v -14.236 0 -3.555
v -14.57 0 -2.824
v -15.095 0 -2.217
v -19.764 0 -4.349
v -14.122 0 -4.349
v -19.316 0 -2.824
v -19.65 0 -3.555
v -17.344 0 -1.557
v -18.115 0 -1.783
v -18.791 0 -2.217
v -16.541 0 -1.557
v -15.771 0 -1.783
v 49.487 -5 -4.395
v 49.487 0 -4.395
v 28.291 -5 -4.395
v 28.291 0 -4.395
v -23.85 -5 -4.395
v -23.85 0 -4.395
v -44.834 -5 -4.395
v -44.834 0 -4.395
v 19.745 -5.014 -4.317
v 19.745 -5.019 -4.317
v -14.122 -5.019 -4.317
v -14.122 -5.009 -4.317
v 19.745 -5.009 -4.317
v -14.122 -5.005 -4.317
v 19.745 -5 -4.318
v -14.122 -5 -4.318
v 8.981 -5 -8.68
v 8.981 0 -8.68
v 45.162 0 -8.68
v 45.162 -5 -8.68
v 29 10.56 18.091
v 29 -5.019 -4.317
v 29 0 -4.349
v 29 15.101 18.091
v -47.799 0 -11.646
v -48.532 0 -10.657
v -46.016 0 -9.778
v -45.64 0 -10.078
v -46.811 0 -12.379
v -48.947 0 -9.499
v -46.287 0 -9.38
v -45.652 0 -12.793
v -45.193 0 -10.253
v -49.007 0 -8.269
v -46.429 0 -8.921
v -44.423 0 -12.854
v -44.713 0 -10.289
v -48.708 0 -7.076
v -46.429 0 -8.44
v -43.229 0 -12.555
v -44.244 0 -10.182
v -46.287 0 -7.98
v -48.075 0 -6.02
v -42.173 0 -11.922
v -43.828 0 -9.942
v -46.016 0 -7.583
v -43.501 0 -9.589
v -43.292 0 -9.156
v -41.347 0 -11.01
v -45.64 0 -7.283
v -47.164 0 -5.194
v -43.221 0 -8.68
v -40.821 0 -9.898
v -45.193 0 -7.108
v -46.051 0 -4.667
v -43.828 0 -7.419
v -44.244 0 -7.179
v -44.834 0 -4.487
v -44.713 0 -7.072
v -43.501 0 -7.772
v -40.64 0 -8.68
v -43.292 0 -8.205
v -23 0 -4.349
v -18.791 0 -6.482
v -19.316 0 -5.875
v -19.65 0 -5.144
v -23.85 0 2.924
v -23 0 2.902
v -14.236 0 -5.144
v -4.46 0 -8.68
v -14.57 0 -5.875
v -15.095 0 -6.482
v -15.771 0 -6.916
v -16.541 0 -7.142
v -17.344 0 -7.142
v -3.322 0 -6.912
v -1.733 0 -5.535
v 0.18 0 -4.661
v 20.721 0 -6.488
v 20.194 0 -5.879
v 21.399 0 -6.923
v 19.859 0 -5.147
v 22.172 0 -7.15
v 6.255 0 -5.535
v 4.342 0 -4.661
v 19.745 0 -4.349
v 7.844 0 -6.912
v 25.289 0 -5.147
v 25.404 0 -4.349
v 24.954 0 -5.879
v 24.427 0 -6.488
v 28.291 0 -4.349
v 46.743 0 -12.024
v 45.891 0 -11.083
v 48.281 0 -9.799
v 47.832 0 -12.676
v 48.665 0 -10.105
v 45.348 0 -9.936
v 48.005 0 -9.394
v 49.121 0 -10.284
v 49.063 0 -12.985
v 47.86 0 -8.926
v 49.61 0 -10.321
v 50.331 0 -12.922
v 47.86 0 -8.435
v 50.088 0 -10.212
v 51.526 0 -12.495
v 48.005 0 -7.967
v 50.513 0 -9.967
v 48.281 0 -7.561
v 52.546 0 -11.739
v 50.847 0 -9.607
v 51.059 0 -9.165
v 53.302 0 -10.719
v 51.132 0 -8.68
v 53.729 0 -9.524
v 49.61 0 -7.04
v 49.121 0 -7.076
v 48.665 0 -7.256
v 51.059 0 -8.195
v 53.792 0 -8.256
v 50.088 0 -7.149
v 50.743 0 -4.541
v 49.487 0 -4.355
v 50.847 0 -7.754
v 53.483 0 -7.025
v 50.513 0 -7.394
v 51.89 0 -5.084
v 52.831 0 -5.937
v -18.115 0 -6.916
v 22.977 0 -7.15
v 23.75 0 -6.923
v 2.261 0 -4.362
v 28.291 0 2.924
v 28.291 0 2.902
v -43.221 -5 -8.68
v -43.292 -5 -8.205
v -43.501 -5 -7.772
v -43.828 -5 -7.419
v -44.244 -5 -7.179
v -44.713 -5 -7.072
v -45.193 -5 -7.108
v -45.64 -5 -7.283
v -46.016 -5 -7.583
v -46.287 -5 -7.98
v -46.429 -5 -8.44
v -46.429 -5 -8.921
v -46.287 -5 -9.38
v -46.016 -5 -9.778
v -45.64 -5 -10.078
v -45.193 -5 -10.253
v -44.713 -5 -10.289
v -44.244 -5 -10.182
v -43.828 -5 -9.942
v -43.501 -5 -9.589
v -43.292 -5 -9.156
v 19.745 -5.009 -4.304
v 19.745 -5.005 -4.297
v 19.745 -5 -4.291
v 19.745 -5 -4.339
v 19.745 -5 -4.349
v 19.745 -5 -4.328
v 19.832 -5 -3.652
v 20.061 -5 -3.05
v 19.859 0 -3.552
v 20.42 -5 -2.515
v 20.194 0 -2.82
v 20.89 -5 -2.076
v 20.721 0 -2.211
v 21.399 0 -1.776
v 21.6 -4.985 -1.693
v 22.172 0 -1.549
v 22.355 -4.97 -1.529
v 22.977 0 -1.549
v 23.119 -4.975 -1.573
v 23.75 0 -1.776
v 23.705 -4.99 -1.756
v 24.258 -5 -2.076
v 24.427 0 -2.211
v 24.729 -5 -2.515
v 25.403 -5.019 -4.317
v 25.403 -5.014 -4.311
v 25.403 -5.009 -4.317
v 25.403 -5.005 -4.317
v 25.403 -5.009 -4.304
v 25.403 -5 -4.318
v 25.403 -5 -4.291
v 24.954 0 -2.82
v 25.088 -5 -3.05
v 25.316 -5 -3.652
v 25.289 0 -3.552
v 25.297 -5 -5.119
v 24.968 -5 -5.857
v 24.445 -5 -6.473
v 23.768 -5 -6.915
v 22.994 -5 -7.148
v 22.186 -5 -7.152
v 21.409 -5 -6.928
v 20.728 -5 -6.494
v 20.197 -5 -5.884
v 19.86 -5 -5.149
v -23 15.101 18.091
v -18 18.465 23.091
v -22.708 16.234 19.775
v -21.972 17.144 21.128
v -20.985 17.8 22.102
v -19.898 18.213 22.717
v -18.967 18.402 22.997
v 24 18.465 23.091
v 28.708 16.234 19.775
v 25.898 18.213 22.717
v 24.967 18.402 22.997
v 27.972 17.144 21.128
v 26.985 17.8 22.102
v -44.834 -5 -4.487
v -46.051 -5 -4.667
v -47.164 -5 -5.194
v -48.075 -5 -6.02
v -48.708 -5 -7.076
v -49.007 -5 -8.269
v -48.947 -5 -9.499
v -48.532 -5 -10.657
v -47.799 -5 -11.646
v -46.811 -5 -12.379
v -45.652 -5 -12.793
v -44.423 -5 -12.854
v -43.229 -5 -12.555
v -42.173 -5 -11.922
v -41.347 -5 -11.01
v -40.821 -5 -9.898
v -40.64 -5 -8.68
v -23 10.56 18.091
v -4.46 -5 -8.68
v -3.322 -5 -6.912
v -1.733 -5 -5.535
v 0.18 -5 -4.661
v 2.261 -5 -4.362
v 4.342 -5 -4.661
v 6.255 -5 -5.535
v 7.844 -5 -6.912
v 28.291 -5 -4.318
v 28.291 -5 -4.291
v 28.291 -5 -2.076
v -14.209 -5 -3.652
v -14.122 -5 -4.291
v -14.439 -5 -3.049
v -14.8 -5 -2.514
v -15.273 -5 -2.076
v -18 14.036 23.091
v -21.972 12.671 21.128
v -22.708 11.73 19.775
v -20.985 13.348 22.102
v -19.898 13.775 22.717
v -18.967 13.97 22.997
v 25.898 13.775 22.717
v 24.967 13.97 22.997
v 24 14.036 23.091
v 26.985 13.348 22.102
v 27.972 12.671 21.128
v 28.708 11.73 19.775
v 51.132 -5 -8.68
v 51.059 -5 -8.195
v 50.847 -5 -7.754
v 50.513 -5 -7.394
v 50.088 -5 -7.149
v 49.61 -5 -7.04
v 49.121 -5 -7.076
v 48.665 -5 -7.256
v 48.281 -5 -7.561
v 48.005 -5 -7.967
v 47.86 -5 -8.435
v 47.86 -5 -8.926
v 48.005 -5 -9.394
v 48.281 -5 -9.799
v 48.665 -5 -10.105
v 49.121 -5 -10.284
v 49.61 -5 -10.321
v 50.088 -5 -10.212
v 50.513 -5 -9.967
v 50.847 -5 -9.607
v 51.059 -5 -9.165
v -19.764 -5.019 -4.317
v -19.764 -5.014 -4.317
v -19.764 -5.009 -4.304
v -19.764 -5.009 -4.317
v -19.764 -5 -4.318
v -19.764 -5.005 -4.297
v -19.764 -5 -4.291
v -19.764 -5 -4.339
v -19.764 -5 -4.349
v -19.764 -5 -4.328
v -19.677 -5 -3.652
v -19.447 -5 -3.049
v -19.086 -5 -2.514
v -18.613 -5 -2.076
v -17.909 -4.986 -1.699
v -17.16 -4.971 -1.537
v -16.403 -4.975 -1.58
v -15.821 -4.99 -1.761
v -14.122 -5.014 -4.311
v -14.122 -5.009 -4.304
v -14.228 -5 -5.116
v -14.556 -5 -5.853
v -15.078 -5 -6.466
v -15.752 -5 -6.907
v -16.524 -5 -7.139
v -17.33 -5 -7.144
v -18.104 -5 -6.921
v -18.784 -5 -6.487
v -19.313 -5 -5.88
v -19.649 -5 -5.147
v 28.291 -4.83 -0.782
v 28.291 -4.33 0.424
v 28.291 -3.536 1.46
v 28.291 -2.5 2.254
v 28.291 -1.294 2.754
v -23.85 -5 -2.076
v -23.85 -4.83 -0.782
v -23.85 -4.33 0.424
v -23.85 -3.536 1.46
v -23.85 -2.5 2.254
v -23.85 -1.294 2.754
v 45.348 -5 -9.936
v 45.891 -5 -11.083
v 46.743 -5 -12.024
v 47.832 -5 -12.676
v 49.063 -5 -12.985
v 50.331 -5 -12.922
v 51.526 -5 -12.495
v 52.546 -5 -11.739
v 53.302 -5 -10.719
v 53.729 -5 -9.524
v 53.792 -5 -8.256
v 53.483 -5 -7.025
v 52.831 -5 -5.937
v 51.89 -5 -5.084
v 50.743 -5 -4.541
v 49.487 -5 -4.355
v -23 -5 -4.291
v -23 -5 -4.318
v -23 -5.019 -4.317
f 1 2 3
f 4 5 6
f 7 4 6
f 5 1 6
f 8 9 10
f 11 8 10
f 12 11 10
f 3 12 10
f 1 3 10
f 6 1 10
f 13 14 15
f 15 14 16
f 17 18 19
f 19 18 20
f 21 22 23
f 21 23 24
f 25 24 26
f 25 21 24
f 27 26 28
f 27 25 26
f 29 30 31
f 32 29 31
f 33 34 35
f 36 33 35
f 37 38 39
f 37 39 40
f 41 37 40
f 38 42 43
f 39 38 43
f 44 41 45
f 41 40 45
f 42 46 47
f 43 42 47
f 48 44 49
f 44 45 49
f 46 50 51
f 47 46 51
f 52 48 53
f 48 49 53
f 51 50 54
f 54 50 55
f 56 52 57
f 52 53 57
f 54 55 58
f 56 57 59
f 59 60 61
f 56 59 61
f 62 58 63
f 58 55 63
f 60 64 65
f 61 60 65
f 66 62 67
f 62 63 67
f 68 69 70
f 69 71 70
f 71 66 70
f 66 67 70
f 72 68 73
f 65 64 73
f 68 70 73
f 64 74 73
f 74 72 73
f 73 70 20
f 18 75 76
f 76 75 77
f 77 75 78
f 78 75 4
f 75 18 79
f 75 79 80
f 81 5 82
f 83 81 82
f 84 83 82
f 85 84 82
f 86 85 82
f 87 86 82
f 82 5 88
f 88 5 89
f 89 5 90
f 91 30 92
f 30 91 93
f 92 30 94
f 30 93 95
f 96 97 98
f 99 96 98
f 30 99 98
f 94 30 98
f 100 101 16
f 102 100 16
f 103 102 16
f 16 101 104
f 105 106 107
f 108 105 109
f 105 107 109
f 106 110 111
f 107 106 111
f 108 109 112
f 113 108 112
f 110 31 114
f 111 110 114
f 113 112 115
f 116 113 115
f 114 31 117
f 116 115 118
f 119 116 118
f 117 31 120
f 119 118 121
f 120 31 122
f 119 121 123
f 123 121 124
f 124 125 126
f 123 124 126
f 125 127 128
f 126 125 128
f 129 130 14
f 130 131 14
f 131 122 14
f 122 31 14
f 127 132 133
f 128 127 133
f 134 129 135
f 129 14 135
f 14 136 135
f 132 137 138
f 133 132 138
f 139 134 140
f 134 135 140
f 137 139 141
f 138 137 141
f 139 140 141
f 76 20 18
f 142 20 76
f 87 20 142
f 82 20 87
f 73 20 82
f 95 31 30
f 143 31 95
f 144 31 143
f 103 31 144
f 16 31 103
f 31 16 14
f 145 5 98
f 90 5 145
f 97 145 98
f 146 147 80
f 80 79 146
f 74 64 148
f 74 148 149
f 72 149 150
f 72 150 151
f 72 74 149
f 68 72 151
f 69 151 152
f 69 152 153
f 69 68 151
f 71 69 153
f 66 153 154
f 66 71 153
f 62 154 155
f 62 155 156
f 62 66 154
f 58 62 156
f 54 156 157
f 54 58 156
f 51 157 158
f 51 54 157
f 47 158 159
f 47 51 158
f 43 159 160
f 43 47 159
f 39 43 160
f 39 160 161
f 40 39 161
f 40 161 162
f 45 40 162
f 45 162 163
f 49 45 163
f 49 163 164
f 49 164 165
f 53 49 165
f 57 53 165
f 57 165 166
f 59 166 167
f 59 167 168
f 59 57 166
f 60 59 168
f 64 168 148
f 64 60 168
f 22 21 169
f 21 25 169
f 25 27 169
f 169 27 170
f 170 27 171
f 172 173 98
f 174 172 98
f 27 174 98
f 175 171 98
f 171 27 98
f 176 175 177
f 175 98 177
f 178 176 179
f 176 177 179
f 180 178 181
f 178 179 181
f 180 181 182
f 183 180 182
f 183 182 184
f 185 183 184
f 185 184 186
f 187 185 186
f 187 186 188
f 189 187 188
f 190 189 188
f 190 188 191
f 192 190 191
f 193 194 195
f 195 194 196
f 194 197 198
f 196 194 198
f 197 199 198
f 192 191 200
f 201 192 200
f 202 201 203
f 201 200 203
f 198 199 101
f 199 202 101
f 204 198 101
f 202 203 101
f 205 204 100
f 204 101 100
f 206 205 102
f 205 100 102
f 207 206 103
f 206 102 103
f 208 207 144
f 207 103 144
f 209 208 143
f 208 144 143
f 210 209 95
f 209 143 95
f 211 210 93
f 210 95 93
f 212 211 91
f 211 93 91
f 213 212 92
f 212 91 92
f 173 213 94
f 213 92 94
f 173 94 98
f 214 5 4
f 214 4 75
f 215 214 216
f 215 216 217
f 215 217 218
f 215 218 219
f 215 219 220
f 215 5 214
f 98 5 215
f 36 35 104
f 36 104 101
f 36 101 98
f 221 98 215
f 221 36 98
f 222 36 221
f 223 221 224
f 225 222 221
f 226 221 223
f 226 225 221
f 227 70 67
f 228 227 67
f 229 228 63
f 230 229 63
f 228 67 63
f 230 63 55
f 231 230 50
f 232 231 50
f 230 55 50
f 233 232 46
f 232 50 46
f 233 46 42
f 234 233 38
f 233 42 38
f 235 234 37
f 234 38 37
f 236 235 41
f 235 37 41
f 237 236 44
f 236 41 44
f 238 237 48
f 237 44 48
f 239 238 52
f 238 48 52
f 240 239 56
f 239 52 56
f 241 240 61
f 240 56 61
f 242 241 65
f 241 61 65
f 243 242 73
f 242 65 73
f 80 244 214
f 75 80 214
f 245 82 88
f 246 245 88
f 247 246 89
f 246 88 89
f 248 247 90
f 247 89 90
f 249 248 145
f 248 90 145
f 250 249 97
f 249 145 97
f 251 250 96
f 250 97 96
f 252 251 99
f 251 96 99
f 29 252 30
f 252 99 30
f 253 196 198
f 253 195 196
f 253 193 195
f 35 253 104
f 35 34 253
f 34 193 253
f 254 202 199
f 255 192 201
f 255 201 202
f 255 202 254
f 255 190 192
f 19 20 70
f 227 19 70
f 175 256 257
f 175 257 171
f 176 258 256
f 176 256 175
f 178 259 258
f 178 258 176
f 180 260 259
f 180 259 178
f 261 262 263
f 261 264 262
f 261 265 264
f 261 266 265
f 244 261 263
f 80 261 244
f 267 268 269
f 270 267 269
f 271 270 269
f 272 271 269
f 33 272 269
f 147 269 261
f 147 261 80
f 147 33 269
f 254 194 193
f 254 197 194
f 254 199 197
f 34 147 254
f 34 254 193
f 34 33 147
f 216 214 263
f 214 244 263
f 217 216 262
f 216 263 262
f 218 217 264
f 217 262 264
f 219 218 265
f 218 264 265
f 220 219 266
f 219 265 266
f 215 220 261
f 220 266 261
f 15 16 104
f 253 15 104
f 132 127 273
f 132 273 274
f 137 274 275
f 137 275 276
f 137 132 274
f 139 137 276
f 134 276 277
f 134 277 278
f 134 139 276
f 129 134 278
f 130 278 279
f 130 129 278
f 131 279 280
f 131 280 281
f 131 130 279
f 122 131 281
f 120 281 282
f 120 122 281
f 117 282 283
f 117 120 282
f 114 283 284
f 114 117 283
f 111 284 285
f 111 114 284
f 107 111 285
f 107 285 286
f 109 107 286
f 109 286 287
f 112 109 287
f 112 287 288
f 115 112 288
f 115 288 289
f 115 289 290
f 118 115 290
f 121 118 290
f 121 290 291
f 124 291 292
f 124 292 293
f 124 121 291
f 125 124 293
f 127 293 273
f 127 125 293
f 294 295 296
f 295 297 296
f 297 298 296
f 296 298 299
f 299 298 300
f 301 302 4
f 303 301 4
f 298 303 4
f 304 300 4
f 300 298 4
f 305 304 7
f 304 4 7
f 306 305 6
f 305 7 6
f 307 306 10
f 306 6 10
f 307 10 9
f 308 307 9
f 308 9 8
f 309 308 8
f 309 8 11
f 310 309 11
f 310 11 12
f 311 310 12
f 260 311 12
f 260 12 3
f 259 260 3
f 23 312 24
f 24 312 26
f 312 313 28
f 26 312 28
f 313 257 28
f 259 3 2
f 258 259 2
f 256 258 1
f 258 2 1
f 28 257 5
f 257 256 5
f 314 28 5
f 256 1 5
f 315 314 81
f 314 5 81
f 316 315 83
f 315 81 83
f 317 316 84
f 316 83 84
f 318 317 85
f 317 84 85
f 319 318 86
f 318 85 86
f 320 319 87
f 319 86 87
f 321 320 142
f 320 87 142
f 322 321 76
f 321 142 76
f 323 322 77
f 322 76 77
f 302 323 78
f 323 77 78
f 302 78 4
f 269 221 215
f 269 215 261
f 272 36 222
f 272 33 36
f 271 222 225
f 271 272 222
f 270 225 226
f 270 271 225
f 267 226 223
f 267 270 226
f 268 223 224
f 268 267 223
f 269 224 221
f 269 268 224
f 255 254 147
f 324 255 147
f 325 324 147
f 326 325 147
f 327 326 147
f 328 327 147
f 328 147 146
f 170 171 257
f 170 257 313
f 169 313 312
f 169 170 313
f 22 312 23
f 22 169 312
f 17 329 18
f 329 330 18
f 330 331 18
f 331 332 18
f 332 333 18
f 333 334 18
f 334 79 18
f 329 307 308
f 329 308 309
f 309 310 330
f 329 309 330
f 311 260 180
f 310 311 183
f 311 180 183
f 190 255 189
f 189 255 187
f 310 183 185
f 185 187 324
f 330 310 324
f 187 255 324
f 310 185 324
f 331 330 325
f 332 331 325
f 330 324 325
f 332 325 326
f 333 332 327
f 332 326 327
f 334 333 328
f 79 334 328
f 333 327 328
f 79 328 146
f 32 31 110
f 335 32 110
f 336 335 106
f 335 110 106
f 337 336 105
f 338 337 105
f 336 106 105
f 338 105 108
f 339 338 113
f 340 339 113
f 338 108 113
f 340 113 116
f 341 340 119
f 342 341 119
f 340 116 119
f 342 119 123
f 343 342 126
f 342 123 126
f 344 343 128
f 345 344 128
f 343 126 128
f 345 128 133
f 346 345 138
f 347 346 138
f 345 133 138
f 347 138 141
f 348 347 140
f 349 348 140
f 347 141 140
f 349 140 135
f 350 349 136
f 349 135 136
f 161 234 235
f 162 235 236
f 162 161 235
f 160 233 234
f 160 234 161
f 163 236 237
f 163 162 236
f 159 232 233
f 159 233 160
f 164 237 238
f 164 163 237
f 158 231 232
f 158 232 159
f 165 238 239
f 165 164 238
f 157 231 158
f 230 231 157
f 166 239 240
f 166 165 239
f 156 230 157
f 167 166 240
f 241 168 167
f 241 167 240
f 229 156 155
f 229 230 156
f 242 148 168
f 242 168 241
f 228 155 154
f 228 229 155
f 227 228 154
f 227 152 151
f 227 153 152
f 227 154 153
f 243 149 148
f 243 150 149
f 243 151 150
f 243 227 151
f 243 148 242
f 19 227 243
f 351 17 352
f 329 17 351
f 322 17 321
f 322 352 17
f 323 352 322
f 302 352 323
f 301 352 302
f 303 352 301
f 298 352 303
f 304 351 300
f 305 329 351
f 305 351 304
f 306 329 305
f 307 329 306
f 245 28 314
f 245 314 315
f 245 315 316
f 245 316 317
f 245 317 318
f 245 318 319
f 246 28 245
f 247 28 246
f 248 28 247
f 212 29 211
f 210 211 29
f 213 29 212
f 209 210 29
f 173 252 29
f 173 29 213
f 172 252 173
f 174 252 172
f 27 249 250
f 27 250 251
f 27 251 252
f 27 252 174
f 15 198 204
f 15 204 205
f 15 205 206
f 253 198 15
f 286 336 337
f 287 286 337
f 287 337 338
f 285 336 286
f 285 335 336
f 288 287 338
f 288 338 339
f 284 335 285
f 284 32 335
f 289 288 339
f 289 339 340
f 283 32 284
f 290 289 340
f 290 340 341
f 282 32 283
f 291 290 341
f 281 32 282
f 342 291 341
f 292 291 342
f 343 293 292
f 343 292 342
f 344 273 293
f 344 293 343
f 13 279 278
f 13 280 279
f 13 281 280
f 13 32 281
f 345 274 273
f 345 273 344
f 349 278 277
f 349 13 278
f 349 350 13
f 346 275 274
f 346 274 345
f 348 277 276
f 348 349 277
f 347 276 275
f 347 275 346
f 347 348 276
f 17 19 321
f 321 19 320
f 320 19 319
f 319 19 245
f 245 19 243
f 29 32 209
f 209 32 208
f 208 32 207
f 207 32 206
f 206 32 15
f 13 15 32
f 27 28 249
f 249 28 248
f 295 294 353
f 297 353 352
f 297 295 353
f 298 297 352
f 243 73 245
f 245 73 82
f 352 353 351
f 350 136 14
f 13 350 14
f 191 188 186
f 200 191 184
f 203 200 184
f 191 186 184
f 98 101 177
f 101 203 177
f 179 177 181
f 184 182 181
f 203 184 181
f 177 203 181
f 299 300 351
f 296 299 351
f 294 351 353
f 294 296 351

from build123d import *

# Parameters (mm, degrees)
F0_R     = 1.6132793462
F0_R_2   = 1.6452292319
F1_DEPTH = 5
F4_DEPTH = 52
F5_W     = 5.1189595833
F5_H     = 18.4771826025
F6_DEPTH = 78.0283830646
F7_R     = 4.99999
F8_R     = 2.8294209196
F8_R_2   = 2.8212759524
F8_R_3   = 7.3886605842
F9_DEPTH = 25


# Not quite as in the source:
# - a fillet or chamfer is up to 0.001 mm smaller than in the source, because OpenCascade refuses the exact size


with BuildPart() as f1:
    # F0 (on Front) → F1 (new body)
    with BuildSketch(Plane.XZ):
        with BuildLine():
            Line((-40.6402352101, -8.6803976446), (45.1620352523, -8.6803976446))
            ThreePointArc((45.1620352523, -8.6803976446), (52.5455844959, -11.7387638798), (49.4872182608, -4.3552146362))
            Line((49.4872182608, -4.3552146362), (49.4872182608, -4.395077005))
            Line((49.4872182608, -4.395077005), (28.2908082008, -4.395077005))
            Line((28.2908082008, -4.395077005), (28.2908082008, 21.208807826))
            Line((28.2908082008, 21.208807826), (-23.8502826542, 21.208807826))
            Line((-23.8502826542, 21.208807826), (-23.8502826542, -4.395077005))
            Line((-23.8502826542, -4.395077005), (-44.8338091373, -4.395077005))
            Line((-44.8338091373, -4.395077005), (-44.8338091373, -4.4868237174))
            ThreePointArc((-44.8338091373, -4.4868237174), (-47.7991136987, -11.645702206), (-40.6402352101, -8.6803976446))
        make_face()
        with Locations((-44.8338091373, -8.6803976446)):
            Circle(F0_R, mode=Mode.SUBTRACT)
        with Locations((49.4872182608, -8.6803976446)):
            Circle(F0_R_2, mode=Mode.SUBTRACT)
    extrude(amount=F1_DEPTH)

    # F3 (on offset) → F4 (join)
    with BuildSketch(Plane.YZ.offset(29)):
        Polygon((14.035618864, 23.0911467224), (-5.0185876898, -4.3173860759), (0, -4.3494757265), (18.4650830925, 23.0911467224), align=None)
    extrude(amount=-F4_DEPTH)

    # F5 (on offset) → F6 (cut, through all)
    with BuildSketch(Plane.YZ.offset(29)):
        with Locations((-2.5594797917, 12.1628475608)):
            Rectangle(F5_W, F5_H)
    extrude(amount=-F6_DEPTH, mode=Mode.SUBTRACT)

    # F7 (radius 5 in the source; OpenCascade refuses exactly that, so slightly less here)
    f7_edges = [f1.edges().sort_by_distance(p)[0] for p in [
        (-23, 16.250351, 23.091147),
        (29, 16.250351, 23.091147),
        (2.220263, -5, 2.924256),
    ]]
    fillet(f7_edges, radius=F7_R)

    # F8 (on face) → F9 (cut)
    with BuildSketch(Plane(origin=(0, 0, 0), x_dir=(-1, 0, 0), z_dir=(0, 1, 0))):
        with Locations((-22.5741807371, -4.3494757265)):
            Circle(F8_R)
        with Locations((16.9429704547, -4.3494757265)):
            Circle(F8_R_2)
        with Locations((-2.2609000211, -11.7509029806)):
            Circle(F8_R_3)
    extrude(amount=-F9_DEPTH, mode=Mode.SUBTRACT)


solid = f1.part
